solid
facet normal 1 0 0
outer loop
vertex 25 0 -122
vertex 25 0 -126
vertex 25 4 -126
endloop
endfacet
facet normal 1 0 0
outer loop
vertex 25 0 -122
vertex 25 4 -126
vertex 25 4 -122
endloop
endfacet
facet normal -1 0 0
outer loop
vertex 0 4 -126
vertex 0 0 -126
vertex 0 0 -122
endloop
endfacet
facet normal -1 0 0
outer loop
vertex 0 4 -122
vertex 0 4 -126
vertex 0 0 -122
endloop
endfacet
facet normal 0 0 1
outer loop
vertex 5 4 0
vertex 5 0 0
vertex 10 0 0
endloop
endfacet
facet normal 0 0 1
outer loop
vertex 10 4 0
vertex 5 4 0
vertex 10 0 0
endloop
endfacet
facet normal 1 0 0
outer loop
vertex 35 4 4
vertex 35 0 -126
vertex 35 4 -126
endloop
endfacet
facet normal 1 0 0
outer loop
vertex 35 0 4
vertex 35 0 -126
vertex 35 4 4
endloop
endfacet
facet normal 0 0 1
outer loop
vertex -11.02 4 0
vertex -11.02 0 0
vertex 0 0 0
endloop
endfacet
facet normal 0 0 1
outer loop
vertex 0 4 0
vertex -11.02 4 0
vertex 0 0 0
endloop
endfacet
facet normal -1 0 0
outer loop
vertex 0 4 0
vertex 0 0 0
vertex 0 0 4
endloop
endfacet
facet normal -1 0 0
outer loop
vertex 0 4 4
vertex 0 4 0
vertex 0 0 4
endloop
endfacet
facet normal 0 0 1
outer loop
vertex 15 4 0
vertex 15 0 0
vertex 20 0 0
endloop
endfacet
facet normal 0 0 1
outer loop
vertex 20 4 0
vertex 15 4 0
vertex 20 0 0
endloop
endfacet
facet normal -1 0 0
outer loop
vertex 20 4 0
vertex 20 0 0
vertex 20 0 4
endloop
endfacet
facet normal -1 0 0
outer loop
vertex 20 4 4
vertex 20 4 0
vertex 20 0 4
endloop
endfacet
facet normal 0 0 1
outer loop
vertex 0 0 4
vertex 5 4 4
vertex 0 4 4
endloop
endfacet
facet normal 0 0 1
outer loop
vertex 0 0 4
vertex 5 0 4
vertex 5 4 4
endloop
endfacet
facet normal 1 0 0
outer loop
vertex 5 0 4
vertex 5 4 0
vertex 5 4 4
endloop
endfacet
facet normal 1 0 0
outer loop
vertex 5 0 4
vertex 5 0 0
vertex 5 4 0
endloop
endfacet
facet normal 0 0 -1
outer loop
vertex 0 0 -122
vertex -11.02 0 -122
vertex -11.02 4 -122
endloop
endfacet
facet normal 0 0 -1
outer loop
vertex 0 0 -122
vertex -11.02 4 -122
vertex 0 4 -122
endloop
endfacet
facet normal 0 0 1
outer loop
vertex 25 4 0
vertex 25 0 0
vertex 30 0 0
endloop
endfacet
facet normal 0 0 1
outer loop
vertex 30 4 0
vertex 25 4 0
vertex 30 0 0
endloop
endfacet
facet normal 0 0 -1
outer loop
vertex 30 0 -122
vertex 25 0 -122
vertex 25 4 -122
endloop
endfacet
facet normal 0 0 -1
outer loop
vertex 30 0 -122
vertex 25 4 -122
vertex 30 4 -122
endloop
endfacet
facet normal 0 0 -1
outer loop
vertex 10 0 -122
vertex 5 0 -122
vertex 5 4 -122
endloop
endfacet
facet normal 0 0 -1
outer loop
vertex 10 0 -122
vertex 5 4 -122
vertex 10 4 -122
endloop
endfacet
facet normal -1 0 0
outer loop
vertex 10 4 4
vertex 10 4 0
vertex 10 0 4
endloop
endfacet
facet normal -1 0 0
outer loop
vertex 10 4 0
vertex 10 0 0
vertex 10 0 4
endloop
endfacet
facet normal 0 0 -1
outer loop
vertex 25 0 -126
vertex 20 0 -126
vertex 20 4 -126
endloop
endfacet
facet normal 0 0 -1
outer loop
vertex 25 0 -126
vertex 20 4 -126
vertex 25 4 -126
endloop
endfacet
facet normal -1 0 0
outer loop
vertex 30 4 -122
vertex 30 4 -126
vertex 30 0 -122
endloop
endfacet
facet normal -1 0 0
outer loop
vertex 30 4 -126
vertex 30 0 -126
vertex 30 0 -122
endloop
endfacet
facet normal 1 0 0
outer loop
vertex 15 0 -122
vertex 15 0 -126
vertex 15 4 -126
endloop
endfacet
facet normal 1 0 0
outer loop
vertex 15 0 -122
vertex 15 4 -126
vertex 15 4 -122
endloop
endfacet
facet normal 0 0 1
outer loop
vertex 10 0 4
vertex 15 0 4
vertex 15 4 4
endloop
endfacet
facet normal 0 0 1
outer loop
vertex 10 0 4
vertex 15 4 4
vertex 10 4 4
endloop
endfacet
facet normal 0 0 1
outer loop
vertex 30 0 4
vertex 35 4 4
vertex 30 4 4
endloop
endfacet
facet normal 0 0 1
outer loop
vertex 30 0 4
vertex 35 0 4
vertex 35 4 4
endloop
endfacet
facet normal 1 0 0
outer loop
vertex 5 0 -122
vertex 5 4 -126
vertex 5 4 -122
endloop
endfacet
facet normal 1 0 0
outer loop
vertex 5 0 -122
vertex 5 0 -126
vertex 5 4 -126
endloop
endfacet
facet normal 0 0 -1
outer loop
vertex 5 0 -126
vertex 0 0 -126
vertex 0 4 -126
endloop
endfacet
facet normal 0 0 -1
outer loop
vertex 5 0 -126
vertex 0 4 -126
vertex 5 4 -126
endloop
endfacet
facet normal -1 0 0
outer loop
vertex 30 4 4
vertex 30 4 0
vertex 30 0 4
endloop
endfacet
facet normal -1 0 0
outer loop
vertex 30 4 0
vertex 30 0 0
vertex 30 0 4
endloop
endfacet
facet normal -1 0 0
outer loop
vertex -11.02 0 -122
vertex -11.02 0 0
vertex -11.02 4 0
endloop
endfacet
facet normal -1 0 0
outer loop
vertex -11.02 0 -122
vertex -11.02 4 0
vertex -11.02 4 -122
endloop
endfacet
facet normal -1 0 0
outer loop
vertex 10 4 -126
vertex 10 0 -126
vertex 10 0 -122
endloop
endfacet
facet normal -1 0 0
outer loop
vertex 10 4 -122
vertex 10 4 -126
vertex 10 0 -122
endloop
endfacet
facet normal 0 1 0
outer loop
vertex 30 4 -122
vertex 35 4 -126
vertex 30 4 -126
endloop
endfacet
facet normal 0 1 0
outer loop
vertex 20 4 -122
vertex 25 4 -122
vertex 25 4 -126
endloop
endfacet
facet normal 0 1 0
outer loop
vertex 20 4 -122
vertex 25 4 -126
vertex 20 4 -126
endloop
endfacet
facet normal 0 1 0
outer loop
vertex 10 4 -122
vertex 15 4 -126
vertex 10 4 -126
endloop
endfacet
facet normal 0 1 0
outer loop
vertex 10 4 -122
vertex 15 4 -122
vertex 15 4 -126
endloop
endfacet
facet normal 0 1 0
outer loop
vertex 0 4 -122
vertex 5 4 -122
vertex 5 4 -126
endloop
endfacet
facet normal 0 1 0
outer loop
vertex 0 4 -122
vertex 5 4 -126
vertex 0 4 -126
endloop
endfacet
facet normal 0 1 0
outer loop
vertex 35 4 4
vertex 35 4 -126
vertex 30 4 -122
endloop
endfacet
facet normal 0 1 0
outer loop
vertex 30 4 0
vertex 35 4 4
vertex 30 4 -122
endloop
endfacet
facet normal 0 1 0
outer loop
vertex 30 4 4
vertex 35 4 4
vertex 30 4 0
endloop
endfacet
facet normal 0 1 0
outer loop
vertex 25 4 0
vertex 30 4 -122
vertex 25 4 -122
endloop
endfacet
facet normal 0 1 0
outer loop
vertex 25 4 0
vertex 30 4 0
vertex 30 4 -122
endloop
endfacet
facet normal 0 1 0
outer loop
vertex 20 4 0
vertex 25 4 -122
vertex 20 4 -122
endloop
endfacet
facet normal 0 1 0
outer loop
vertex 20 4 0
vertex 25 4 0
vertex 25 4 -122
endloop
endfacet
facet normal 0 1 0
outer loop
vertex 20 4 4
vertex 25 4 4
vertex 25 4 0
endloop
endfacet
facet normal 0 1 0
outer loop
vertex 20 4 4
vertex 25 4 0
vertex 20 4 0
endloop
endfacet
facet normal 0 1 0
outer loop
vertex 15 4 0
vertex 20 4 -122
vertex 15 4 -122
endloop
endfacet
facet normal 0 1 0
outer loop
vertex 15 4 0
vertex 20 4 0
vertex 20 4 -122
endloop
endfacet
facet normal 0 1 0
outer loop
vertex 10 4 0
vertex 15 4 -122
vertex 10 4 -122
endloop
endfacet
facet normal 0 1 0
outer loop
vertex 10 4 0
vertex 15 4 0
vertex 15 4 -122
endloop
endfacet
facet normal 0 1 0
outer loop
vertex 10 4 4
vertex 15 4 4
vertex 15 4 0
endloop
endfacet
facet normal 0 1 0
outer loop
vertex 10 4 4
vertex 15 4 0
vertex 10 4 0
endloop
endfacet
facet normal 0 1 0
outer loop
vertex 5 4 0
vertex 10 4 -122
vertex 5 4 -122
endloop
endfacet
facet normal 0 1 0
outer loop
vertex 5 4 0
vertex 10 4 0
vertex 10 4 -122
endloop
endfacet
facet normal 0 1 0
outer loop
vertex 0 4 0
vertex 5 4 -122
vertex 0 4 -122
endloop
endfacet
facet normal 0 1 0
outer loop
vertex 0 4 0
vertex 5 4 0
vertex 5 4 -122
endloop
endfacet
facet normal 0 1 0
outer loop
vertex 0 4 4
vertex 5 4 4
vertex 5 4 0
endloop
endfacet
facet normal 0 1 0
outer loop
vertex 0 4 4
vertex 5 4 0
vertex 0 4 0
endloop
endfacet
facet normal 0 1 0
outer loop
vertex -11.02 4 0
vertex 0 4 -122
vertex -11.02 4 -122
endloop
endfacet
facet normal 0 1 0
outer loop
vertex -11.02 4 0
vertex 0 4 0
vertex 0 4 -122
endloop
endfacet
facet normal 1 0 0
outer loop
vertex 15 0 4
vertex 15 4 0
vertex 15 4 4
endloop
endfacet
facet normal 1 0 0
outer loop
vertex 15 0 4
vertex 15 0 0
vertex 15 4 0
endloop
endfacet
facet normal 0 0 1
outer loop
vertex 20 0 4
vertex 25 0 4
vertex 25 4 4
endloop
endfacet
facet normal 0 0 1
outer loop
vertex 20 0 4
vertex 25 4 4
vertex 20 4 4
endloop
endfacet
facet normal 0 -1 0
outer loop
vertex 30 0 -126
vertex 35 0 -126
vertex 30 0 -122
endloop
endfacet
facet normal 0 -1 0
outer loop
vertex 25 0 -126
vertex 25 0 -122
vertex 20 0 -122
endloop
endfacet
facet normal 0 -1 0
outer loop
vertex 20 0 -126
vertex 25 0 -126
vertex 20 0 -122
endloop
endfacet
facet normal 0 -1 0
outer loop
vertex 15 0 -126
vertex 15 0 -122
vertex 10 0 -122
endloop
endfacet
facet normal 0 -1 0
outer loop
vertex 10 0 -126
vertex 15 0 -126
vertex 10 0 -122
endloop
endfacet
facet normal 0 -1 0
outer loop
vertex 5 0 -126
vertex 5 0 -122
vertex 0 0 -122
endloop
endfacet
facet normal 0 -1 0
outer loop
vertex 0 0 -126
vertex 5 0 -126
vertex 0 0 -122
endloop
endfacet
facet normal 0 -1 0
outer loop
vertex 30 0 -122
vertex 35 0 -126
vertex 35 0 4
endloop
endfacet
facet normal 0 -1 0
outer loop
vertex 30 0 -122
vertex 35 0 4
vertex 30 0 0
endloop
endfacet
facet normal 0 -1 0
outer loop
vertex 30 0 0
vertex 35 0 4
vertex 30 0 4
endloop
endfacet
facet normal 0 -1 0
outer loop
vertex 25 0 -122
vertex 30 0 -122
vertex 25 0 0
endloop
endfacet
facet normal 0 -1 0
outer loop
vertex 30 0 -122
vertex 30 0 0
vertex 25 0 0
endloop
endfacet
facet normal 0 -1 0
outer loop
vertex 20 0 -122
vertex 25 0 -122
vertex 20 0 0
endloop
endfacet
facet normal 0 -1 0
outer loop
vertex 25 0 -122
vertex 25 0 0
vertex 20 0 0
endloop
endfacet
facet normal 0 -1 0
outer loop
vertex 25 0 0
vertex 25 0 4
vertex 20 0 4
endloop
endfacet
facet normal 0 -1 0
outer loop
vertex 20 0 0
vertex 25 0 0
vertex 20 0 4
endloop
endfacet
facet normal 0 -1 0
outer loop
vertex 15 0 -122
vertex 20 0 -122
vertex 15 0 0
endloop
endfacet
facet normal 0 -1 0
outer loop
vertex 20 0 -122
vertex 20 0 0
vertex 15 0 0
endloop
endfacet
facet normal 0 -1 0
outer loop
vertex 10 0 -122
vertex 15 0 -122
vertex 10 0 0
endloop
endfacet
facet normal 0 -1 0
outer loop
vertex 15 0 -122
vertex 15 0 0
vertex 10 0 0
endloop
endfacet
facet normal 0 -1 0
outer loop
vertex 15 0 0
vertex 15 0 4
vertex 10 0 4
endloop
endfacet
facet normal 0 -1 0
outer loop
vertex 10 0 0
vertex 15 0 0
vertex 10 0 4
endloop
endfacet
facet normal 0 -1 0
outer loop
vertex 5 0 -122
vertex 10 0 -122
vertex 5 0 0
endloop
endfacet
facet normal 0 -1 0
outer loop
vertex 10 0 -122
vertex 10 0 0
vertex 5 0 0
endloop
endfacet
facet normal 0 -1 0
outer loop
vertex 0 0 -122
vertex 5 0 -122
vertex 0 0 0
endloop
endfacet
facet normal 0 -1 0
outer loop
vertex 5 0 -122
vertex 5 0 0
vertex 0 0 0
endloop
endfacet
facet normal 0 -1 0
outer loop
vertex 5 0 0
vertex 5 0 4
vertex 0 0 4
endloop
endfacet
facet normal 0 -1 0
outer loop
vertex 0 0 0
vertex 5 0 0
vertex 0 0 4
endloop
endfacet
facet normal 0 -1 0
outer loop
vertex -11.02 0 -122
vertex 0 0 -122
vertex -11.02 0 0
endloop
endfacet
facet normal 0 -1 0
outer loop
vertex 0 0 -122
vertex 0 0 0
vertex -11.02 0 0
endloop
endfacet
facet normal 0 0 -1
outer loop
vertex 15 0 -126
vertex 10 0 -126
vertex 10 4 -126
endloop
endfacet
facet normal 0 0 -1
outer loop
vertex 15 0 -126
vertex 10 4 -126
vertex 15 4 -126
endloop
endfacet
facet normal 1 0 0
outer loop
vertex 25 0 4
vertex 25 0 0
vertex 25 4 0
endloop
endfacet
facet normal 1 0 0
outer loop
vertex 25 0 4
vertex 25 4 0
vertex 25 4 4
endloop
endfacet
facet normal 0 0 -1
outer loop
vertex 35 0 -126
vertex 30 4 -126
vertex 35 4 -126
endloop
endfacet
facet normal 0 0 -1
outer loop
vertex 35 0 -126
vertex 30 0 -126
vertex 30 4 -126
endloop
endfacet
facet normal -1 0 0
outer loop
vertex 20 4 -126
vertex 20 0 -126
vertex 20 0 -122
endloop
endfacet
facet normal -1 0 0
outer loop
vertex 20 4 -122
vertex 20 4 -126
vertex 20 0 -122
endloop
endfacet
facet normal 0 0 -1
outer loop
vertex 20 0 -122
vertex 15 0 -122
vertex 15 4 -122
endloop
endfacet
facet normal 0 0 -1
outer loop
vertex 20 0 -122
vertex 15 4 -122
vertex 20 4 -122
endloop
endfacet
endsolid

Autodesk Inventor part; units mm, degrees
ref_plane "YZ Plane" through (0, 0, 0) normal (1, 0, 0) x (0, 1, 0)
ref_plane "XZ Plane" through (0, 0, 0) normal (0, 1, 0) x (-1, 0, 0)
ref_plane "XY Plane" through (0, 0, 0) normal (0, 0, 1) x (1, 0, 0)
sketch "Sketch1" plane through (0, 0, 0) normal (0, 1, 0) x (-1, 0, 0)
  line L0 (11.02, 0) -> (0, 0)
  line L1 (-5, -122) -> (0, -122)
  line L2 (11.02, 0) -> (11.02, -122)
  line L3 (11.02, 0) -> (133.02, 0) construction
  line L4 (11.02, -122) -> (0, -122)
  line L5 (0, -126) -> (0, -122)
  line L6 (-5, -126) -> (-5, -122)
  line L7 (0, -126) -> (-5, -126)
  line L8 (-35, -122) -> (-30, -122)
  line L9 (-30, 0) -> (-35, 0)
  line L10 (0, -122) -> (-35, -122)
  line L11 (-35, -122) -> (-35, 0)
  line L12 (0, 0) -> (-35, 0)
  line L13 (-35, 0) -> (-35, 4)
  line L14 (-35, 4) -> (-30, 4)
  line L15 (-30, 0) -> (-30, 4)
  line L16 (-20, 0) -> (-20, 4)
  line L17 (-25, 4) -> (-20, 4)
  line L18 (-25, 0) -> (-25, 4)
  line L19 (-15, 0) -> (-15, 4)
  line L20 (-15, 4) -> (-10, 4)
  line L21 (-10, 0) -> (-10, 4)
  line L22 (0, 0) -> (0, 4)
  line L23 (-5, 4) -> (0, 4)
  line L24 (-5, 0) -> (-5, 4)
  line L25 (0, -126) -> (-5, -126)
  line L26 (-10, -126) -> (-10, -122)
  line L27 (-10, -126) -> (-15, -126)
  line L28 (-15, -126) -> (-15, -122)
  line L29 (-20, -126) -> (-20, -122)
  line L30 (-20, -126) -> (-25, -126)
  line L31 (-25, -126) -> (-25, -122)
  line L32 (-30, -126) -> (-30, -122)
  line L33 (-30, -126) -> (-35, -126)
  line L34 (-35, -126) -> (-35, -122)
  dimension "d0" = 90
extrude "Extrusion1" add sketch "Sketch1" along normal blind 4
properties part number "Angle_Zwischenebene"
